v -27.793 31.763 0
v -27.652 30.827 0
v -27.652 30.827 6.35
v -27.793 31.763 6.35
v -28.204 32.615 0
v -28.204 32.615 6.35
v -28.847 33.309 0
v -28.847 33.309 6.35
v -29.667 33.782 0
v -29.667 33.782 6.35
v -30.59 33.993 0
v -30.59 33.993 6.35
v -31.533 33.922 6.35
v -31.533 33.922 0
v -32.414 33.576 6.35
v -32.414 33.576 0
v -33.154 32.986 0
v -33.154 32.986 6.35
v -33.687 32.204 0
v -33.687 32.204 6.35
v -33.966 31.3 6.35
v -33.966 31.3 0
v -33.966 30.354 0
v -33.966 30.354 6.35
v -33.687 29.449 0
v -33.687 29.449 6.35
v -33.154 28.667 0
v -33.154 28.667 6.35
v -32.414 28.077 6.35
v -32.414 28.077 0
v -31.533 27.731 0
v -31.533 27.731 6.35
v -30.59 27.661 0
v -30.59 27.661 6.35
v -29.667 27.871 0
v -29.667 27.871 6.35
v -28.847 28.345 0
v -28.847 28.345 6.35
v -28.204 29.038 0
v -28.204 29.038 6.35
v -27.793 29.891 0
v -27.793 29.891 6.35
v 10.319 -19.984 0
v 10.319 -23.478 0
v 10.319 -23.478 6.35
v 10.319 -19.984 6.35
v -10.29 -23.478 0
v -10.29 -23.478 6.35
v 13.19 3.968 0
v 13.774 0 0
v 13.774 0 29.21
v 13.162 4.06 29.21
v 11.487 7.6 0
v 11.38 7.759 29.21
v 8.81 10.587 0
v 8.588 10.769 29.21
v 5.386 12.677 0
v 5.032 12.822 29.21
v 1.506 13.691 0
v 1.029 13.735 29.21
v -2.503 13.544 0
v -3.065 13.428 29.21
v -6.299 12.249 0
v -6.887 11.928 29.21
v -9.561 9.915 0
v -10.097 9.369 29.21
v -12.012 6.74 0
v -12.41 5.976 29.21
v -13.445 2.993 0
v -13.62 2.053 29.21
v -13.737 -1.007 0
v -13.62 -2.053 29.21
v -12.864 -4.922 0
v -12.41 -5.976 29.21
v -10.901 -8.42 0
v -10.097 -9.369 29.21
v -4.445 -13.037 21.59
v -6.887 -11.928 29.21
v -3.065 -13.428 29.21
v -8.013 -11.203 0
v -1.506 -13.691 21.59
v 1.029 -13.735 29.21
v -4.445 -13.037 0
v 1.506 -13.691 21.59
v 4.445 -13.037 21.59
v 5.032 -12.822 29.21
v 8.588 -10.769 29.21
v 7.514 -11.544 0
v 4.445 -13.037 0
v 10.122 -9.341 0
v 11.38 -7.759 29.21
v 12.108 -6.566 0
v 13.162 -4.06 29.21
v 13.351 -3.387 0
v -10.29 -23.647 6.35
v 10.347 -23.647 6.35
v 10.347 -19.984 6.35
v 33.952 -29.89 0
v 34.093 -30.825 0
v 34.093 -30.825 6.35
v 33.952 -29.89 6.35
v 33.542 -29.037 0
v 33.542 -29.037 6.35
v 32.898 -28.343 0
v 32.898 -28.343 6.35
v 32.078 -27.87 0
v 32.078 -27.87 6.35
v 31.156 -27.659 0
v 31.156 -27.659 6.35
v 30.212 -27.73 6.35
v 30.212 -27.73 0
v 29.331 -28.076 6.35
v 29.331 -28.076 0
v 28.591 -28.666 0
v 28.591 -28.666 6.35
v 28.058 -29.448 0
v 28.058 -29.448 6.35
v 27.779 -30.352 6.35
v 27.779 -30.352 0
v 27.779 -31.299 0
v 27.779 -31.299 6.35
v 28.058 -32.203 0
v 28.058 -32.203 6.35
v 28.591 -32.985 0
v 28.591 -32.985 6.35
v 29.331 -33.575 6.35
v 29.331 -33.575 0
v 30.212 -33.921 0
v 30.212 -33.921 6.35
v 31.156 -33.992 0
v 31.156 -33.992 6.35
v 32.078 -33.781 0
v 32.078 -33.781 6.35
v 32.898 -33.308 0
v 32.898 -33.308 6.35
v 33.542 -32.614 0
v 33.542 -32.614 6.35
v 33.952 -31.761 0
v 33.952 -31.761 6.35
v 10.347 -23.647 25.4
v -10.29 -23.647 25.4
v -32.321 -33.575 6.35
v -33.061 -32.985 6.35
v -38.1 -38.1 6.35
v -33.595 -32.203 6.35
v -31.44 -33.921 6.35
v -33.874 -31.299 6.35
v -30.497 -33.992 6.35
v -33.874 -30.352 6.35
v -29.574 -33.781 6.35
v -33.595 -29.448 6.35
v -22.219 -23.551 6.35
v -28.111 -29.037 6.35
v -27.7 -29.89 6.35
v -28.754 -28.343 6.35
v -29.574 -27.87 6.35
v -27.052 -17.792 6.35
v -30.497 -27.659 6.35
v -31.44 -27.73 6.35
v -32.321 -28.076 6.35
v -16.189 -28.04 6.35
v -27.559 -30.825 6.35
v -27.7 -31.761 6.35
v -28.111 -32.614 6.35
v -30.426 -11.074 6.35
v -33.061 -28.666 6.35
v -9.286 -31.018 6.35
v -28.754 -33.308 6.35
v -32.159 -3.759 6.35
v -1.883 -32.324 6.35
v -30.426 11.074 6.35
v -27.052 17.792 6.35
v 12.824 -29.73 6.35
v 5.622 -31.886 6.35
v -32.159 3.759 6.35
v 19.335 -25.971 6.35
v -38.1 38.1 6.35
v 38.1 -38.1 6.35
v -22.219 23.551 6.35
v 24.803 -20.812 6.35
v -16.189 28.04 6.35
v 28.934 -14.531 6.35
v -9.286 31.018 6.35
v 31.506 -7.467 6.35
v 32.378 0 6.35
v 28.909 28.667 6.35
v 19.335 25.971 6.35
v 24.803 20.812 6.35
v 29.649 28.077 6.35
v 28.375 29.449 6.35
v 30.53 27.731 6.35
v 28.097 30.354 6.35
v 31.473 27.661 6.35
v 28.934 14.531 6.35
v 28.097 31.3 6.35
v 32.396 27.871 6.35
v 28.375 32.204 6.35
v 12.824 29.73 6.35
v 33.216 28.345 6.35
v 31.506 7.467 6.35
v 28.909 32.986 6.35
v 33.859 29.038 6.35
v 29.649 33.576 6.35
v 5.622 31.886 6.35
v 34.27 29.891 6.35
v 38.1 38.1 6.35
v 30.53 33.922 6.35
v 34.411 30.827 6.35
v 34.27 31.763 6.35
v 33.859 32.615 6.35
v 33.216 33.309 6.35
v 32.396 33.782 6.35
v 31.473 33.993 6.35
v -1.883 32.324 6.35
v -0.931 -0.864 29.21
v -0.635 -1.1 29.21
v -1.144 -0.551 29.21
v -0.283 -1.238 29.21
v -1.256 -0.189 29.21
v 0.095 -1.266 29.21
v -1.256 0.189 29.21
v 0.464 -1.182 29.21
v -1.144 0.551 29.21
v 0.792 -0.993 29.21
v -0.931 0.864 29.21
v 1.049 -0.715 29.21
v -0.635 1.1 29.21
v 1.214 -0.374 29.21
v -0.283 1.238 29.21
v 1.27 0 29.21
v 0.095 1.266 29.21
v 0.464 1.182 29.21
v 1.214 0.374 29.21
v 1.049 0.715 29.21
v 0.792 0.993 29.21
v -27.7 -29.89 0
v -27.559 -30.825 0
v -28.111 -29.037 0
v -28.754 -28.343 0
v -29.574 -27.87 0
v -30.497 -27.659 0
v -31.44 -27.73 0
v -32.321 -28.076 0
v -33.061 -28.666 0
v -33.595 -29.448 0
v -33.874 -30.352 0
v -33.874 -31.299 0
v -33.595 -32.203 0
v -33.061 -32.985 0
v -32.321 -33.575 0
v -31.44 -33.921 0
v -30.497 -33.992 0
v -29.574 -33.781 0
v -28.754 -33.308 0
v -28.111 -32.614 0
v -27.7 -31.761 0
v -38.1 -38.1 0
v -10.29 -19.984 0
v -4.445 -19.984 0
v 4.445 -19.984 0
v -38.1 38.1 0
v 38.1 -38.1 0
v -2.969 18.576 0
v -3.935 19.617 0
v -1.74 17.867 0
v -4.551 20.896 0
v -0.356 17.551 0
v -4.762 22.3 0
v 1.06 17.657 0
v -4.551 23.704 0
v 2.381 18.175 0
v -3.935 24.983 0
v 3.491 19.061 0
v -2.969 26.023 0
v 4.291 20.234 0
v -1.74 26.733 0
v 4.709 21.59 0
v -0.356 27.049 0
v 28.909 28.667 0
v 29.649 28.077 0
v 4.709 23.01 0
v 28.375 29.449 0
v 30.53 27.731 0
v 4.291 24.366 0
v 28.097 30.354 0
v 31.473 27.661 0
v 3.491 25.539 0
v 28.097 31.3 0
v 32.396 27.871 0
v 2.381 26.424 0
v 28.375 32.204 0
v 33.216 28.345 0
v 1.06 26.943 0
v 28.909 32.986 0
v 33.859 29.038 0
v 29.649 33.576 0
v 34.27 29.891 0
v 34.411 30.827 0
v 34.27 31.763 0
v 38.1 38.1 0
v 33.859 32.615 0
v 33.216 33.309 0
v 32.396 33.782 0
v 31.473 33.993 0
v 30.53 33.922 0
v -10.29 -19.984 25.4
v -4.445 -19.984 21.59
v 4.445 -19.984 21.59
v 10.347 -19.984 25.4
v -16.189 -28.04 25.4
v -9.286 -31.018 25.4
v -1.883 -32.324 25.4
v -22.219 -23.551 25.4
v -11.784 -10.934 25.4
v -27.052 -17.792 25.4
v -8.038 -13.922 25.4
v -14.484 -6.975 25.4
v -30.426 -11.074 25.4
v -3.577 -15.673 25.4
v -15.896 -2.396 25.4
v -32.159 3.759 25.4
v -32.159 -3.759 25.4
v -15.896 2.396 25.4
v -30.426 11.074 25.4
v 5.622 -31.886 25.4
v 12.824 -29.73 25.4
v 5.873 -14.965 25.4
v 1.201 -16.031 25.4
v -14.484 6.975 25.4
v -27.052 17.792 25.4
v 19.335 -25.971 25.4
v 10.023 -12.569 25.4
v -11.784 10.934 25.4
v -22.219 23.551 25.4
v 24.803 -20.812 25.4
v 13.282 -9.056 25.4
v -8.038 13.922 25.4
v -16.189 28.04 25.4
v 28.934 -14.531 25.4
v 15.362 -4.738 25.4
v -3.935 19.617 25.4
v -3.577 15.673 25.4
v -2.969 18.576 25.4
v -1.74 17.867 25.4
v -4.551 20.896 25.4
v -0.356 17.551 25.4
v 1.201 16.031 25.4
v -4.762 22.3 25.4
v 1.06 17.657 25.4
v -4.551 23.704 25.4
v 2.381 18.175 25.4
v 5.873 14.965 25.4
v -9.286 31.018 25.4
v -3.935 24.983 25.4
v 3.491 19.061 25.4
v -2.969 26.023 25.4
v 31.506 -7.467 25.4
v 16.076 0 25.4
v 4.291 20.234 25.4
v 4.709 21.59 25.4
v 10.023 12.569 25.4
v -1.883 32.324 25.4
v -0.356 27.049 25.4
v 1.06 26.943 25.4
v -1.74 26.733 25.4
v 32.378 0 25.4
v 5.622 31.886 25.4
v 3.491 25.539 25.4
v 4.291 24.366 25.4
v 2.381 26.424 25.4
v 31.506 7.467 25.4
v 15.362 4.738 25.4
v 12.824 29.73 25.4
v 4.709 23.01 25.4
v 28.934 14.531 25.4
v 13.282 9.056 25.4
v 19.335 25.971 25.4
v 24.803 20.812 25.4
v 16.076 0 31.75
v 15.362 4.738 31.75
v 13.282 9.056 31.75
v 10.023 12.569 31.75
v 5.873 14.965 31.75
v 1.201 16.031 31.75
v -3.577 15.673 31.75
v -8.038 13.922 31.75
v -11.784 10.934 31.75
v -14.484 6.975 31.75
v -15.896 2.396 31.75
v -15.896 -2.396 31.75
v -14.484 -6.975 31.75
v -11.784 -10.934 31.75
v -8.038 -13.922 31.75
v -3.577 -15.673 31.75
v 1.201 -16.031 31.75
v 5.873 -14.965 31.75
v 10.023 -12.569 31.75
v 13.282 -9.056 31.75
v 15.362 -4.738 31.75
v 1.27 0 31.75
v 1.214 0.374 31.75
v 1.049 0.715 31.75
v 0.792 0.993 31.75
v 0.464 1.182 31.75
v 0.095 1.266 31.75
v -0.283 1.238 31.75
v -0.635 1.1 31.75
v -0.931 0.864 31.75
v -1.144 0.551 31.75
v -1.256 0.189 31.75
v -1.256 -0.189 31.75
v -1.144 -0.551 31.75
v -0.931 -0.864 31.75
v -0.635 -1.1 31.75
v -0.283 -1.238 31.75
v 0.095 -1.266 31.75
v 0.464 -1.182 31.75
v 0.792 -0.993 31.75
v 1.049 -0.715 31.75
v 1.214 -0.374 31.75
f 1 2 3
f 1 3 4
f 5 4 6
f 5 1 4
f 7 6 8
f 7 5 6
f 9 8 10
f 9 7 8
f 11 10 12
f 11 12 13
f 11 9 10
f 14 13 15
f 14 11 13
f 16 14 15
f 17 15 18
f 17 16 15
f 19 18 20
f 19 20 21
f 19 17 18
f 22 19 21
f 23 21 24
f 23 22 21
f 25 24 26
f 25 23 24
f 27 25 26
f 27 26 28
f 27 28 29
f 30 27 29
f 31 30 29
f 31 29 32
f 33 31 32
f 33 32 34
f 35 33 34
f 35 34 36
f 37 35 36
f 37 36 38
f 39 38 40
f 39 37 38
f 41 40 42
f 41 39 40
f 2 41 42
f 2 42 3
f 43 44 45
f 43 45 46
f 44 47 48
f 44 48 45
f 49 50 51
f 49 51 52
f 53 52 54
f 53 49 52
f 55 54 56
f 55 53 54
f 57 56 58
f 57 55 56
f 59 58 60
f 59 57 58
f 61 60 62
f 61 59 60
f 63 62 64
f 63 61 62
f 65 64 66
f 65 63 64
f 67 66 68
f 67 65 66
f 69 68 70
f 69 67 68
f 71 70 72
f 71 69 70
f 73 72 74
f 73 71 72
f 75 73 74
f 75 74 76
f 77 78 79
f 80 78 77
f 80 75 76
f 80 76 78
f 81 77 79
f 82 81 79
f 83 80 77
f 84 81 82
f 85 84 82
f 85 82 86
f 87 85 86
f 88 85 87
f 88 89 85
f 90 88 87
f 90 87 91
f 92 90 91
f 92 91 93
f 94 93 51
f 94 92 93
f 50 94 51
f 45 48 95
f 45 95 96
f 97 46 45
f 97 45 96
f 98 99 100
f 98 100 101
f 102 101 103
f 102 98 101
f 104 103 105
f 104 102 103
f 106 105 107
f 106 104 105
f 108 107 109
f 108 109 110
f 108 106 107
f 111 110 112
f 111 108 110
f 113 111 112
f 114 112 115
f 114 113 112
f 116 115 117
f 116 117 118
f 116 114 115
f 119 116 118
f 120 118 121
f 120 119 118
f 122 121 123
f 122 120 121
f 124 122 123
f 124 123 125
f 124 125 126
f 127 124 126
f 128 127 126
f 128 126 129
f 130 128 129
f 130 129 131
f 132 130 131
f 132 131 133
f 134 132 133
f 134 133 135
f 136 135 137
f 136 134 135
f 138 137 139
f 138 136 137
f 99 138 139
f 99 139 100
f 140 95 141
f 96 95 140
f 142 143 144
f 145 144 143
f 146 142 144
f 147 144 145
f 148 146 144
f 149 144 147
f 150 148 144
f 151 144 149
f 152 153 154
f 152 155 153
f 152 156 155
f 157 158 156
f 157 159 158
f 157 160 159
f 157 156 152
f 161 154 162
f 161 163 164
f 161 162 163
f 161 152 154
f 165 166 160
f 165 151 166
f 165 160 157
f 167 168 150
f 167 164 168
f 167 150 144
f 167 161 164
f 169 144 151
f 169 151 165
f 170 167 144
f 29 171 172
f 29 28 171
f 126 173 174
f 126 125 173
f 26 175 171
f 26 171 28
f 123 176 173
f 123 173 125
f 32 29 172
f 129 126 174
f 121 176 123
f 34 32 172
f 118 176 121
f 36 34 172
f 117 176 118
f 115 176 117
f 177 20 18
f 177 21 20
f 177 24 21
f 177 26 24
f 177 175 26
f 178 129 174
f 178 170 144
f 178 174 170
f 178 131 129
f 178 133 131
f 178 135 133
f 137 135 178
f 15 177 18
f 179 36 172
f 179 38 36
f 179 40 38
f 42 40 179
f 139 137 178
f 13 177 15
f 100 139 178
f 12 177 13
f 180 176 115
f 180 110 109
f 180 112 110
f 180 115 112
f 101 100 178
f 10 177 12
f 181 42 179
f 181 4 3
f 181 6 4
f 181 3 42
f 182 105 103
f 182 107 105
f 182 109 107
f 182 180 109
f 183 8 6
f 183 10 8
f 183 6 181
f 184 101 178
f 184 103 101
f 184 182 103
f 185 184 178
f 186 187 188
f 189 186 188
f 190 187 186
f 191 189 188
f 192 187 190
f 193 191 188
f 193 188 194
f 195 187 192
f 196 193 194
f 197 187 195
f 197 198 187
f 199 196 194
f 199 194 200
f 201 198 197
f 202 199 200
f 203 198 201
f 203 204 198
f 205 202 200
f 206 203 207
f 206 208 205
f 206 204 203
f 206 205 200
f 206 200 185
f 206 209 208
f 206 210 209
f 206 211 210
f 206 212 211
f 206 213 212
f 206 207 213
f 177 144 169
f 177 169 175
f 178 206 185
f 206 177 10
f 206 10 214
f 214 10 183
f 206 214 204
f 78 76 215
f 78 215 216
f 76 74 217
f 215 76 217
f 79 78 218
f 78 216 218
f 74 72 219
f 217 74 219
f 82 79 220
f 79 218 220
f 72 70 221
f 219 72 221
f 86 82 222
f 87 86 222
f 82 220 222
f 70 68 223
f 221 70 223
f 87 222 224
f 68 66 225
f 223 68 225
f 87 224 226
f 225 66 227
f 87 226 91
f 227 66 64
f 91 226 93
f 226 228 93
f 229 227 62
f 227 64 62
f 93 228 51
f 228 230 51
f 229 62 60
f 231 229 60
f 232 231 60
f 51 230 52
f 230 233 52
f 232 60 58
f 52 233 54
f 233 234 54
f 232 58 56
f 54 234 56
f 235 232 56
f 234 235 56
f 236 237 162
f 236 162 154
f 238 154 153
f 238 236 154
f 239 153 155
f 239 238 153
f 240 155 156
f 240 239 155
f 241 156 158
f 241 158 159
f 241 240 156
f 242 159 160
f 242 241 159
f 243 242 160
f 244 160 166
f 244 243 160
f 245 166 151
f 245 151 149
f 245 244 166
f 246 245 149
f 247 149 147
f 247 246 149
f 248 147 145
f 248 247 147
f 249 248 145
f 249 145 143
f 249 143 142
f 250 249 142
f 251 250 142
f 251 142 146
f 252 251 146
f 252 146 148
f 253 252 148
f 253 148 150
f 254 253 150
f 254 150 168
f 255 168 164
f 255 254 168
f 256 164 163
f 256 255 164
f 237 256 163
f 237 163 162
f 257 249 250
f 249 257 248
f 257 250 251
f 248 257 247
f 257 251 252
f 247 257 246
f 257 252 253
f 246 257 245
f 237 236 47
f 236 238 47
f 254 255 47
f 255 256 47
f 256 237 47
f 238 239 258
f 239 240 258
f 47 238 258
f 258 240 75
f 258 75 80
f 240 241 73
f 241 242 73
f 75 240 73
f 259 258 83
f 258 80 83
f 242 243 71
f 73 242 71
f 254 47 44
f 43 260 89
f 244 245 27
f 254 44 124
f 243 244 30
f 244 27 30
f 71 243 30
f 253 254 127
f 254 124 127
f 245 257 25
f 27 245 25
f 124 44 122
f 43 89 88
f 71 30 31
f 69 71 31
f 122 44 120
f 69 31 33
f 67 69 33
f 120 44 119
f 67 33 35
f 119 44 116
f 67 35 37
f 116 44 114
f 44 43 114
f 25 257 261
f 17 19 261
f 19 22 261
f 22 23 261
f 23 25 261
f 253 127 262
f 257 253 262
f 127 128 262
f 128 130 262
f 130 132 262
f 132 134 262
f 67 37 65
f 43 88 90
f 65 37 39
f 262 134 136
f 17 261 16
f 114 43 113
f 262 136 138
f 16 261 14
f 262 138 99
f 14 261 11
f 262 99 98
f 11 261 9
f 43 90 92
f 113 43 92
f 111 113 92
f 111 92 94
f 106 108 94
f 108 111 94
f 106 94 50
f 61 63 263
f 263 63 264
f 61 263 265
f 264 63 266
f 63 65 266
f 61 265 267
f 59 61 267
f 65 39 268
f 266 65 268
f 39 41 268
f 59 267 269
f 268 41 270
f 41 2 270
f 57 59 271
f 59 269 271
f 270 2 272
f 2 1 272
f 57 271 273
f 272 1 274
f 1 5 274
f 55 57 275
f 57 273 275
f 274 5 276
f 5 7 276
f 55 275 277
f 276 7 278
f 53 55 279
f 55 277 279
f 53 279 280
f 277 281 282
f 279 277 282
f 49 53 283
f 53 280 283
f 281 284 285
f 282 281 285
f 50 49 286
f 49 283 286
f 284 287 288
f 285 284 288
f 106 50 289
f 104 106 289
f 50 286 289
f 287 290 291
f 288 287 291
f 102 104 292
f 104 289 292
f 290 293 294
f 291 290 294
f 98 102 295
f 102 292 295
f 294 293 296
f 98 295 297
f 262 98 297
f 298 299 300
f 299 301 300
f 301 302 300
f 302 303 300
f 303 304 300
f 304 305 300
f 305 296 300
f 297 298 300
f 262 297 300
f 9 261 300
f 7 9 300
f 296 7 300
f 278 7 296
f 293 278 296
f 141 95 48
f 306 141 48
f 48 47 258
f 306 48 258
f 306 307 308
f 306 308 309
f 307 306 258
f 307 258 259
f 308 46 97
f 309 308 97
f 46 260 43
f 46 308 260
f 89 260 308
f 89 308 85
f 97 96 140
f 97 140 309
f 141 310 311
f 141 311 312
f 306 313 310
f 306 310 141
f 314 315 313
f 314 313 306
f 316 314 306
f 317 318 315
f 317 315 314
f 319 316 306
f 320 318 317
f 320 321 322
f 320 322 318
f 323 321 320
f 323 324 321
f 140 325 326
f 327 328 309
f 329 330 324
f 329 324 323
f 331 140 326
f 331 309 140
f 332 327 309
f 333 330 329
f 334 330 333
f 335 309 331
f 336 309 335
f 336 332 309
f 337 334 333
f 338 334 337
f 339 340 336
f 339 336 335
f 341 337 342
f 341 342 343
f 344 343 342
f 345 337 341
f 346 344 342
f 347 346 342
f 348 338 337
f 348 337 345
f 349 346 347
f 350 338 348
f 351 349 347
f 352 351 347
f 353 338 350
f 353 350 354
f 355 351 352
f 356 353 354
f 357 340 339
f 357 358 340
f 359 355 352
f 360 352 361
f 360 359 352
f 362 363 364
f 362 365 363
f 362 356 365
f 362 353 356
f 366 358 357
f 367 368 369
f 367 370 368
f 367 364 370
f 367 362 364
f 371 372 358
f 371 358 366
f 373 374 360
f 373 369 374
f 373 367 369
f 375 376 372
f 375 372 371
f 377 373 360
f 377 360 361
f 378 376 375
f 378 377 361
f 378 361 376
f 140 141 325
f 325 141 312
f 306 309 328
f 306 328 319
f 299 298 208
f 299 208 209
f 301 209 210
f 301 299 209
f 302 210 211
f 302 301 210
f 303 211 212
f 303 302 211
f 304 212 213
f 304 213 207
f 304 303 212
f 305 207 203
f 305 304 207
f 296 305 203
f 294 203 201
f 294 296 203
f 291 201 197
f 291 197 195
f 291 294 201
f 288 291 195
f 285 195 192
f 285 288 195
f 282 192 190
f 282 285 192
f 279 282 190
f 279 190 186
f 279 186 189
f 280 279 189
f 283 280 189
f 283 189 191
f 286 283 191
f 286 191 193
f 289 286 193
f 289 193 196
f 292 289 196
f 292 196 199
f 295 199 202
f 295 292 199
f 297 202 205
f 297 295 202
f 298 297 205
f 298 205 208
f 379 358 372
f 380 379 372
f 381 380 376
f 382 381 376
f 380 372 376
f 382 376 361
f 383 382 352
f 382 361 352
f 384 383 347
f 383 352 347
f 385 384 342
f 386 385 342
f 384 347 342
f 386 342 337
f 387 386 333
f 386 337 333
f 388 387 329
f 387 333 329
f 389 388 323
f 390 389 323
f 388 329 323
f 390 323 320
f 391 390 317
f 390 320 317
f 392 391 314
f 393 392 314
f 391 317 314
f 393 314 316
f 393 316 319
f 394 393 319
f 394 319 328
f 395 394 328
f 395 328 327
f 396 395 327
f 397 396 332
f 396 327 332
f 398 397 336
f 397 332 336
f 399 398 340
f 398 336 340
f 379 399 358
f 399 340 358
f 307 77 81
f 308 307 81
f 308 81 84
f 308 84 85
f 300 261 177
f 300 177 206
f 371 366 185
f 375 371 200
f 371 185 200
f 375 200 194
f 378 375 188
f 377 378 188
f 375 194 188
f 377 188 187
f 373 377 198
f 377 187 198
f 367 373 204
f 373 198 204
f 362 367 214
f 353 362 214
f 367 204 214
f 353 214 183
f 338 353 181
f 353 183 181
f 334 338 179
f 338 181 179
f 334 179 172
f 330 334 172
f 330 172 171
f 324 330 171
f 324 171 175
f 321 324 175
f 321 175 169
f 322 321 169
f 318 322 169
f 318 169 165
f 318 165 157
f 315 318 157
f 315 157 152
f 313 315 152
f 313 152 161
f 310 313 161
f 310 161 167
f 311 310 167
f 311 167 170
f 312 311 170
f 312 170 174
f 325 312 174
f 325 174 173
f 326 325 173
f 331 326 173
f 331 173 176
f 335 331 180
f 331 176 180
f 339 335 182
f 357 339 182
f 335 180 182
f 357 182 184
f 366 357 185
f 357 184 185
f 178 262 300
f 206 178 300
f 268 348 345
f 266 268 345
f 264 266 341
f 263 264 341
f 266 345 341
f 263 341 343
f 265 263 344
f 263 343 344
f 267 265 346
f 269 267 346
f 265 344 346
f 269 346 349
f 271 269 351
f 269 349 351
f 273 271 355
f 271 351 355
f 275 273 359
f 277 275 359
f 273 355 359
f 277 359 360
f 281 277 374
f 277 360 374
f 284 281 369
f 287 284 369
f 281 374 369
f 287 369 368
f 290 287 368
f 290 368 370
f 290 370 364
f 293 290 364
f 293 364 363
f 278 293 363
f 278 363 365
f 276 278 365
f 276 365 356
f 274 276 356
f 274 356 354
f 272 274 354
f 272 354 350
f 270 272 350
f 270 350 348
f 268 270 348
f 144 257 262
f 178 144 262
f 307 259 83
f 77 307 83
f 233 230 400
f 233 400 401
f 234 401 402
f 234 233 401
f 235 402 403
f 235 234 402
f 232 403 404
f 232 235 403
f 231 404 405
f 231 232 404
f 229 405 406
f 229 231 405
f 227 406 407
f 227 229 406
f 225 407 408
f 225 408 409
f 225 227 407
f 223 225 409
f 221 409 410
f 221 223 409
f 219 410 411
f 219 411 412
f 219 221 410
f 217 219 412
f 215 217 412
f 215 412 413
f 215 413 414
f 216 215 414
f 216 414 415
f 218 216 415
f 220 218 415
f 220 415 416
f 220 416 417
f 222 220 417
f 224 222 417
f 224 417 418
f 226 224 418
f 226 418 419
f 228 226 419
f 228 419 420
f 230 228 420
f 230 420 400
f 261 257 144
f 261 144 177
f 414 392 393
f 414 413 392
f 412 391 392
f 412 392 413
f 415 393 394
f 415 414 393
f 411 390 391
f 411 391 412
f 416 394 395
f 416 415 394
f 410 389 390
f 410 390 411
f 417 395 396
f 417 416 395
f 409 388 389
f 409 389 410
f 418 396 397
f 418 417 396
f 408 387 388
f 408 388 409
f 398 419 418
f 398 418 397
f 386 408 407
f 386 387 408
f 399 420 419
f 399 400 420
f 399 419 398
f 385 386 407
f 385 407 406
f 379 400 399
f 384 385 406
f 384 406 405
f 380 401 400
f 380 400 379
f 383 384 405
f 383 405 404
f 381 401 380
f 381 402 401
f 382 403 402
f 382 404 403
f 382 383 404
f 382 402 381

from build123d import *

# Parameters (mm, degrees)
F0_W      = 76.2
F0_H      = 76.2
F0_R      = 3.175
F5_DEPTH  = 6.35
F1_R      = 13.7737792641
F6_DEPTH  = 25.4
F3_R      = 5.199817611
F7_DEPTH  = 25.4
F4_W      = 20.6375
F4_H      = 3.6285714286
F8_DEPTH  = 25.4
F2_R      = 32.3782922644
F2_W      = 20.6375
F2_H      = 3.6632169593
F9_DEPTH  = 25.4
F10_D     = 9.525
F11_R     = 16.0757593031
F11_R_2   = 13.7737792641
F11_R_3   = 1.27
F12_DEPTH = 6.35
F13_DEPTH = 29.21
F14_W     = 8.89
F14_H     = 8.3891552745
F15_DEPTH = 21.59


with BuildPart() as f5:
    # F0 (on Top) → F5 (new body)
    with BuildSketch(Plane.XY):
        Rectangle(F0_W, F0_H)
        with Locations((-30.7339914143, -30.8254174888)):
            Circle(F0_R, mode=Mode.SUBTRACT)
        with Locations((30.9182778001, -30.8254174888)):
            Circle(F0_R, mode=Mode.SUBTRACT)
        with Locations((-30.8268517256, 30.8268517256)):
            Circle(F0_R, mode=Mode.SUBTRACT)
        with Locations((31.2360748649, 30.8268517256)):
            Circle(F0_R, mode=Mode.SUBTRACT)
    extrude(amount=F5_DEPTH)

    # F1 (on face) → F6 (cut)
    with BuildSketch(Plane.XY):
        Circle(F1_R)
    extrude(amount=F6_DEPTH, mode=Mode.SUBTRACT)

    # F3 (on face) → F7 (cut)
    with BuildSketch(Plane.XY):
        with Locations((0, 22.2998782992)):
            Circle(F3_R)
    extrude(amount=F7_DEPTH, mode=Mode.SUBTRACT)

    # F4 (on face) → F8 (cut)
    with BuildSketch(Plane.XY):
        with Locations((0, -21.663627077)):
            Rectangle(F4_W, F4_H)
    extrude(amount=F8_DEPTH, mode=Mode.SUBTRACT)

    # F2 (on face) → F9 (join)
    with BuildSketch(Plane.XY):
        Circle(F2_R)
        with Locations((0.0286572114, -21.8153223838)):
            Rectangle(F2_W, F2_H, mode=Mode.SUBTRACT)
    extrude(amount=F9_DEPTH)

    # F10 (through all)
    with Locations(Plane(origin=(0, 0, 0), x_dir=(1, 0, 0), z_dir=(0, 0, -1))):
        with Locations((0, -22.2998782992)):
            Hole(F10_D / 2)

    # F11 (on face) → F12 (join)
    with BuildSketch(Plane.XY.offset(25.4)):
        Circle(F11_R)
        Circle(F11_R_2, mode=Mode.SUBTRACT)
        Circle(F11_R_2)
        Circle(F11_R_3, mode=Mode.SUBTRACT)
    extrude(amount=F12_DEPTH)

    # F1 (on face) → F13 (cut)
    with BuildSketch(Plane.XY):
        Circle(F1_R)
    extrude(amount=F13_DEPTH, mode=Mode.SUBTRACT)

    # F14 (on face) → F15 (cut)
    with BuildSketch(Plane.XY):
        with Locations((0, -16.7856216431)):
            Rectangle(F14_W, F14_H)
    extrude(amount=F15_DEPTH, mode=Mode.SUBTRACT)


solid = f5.part
